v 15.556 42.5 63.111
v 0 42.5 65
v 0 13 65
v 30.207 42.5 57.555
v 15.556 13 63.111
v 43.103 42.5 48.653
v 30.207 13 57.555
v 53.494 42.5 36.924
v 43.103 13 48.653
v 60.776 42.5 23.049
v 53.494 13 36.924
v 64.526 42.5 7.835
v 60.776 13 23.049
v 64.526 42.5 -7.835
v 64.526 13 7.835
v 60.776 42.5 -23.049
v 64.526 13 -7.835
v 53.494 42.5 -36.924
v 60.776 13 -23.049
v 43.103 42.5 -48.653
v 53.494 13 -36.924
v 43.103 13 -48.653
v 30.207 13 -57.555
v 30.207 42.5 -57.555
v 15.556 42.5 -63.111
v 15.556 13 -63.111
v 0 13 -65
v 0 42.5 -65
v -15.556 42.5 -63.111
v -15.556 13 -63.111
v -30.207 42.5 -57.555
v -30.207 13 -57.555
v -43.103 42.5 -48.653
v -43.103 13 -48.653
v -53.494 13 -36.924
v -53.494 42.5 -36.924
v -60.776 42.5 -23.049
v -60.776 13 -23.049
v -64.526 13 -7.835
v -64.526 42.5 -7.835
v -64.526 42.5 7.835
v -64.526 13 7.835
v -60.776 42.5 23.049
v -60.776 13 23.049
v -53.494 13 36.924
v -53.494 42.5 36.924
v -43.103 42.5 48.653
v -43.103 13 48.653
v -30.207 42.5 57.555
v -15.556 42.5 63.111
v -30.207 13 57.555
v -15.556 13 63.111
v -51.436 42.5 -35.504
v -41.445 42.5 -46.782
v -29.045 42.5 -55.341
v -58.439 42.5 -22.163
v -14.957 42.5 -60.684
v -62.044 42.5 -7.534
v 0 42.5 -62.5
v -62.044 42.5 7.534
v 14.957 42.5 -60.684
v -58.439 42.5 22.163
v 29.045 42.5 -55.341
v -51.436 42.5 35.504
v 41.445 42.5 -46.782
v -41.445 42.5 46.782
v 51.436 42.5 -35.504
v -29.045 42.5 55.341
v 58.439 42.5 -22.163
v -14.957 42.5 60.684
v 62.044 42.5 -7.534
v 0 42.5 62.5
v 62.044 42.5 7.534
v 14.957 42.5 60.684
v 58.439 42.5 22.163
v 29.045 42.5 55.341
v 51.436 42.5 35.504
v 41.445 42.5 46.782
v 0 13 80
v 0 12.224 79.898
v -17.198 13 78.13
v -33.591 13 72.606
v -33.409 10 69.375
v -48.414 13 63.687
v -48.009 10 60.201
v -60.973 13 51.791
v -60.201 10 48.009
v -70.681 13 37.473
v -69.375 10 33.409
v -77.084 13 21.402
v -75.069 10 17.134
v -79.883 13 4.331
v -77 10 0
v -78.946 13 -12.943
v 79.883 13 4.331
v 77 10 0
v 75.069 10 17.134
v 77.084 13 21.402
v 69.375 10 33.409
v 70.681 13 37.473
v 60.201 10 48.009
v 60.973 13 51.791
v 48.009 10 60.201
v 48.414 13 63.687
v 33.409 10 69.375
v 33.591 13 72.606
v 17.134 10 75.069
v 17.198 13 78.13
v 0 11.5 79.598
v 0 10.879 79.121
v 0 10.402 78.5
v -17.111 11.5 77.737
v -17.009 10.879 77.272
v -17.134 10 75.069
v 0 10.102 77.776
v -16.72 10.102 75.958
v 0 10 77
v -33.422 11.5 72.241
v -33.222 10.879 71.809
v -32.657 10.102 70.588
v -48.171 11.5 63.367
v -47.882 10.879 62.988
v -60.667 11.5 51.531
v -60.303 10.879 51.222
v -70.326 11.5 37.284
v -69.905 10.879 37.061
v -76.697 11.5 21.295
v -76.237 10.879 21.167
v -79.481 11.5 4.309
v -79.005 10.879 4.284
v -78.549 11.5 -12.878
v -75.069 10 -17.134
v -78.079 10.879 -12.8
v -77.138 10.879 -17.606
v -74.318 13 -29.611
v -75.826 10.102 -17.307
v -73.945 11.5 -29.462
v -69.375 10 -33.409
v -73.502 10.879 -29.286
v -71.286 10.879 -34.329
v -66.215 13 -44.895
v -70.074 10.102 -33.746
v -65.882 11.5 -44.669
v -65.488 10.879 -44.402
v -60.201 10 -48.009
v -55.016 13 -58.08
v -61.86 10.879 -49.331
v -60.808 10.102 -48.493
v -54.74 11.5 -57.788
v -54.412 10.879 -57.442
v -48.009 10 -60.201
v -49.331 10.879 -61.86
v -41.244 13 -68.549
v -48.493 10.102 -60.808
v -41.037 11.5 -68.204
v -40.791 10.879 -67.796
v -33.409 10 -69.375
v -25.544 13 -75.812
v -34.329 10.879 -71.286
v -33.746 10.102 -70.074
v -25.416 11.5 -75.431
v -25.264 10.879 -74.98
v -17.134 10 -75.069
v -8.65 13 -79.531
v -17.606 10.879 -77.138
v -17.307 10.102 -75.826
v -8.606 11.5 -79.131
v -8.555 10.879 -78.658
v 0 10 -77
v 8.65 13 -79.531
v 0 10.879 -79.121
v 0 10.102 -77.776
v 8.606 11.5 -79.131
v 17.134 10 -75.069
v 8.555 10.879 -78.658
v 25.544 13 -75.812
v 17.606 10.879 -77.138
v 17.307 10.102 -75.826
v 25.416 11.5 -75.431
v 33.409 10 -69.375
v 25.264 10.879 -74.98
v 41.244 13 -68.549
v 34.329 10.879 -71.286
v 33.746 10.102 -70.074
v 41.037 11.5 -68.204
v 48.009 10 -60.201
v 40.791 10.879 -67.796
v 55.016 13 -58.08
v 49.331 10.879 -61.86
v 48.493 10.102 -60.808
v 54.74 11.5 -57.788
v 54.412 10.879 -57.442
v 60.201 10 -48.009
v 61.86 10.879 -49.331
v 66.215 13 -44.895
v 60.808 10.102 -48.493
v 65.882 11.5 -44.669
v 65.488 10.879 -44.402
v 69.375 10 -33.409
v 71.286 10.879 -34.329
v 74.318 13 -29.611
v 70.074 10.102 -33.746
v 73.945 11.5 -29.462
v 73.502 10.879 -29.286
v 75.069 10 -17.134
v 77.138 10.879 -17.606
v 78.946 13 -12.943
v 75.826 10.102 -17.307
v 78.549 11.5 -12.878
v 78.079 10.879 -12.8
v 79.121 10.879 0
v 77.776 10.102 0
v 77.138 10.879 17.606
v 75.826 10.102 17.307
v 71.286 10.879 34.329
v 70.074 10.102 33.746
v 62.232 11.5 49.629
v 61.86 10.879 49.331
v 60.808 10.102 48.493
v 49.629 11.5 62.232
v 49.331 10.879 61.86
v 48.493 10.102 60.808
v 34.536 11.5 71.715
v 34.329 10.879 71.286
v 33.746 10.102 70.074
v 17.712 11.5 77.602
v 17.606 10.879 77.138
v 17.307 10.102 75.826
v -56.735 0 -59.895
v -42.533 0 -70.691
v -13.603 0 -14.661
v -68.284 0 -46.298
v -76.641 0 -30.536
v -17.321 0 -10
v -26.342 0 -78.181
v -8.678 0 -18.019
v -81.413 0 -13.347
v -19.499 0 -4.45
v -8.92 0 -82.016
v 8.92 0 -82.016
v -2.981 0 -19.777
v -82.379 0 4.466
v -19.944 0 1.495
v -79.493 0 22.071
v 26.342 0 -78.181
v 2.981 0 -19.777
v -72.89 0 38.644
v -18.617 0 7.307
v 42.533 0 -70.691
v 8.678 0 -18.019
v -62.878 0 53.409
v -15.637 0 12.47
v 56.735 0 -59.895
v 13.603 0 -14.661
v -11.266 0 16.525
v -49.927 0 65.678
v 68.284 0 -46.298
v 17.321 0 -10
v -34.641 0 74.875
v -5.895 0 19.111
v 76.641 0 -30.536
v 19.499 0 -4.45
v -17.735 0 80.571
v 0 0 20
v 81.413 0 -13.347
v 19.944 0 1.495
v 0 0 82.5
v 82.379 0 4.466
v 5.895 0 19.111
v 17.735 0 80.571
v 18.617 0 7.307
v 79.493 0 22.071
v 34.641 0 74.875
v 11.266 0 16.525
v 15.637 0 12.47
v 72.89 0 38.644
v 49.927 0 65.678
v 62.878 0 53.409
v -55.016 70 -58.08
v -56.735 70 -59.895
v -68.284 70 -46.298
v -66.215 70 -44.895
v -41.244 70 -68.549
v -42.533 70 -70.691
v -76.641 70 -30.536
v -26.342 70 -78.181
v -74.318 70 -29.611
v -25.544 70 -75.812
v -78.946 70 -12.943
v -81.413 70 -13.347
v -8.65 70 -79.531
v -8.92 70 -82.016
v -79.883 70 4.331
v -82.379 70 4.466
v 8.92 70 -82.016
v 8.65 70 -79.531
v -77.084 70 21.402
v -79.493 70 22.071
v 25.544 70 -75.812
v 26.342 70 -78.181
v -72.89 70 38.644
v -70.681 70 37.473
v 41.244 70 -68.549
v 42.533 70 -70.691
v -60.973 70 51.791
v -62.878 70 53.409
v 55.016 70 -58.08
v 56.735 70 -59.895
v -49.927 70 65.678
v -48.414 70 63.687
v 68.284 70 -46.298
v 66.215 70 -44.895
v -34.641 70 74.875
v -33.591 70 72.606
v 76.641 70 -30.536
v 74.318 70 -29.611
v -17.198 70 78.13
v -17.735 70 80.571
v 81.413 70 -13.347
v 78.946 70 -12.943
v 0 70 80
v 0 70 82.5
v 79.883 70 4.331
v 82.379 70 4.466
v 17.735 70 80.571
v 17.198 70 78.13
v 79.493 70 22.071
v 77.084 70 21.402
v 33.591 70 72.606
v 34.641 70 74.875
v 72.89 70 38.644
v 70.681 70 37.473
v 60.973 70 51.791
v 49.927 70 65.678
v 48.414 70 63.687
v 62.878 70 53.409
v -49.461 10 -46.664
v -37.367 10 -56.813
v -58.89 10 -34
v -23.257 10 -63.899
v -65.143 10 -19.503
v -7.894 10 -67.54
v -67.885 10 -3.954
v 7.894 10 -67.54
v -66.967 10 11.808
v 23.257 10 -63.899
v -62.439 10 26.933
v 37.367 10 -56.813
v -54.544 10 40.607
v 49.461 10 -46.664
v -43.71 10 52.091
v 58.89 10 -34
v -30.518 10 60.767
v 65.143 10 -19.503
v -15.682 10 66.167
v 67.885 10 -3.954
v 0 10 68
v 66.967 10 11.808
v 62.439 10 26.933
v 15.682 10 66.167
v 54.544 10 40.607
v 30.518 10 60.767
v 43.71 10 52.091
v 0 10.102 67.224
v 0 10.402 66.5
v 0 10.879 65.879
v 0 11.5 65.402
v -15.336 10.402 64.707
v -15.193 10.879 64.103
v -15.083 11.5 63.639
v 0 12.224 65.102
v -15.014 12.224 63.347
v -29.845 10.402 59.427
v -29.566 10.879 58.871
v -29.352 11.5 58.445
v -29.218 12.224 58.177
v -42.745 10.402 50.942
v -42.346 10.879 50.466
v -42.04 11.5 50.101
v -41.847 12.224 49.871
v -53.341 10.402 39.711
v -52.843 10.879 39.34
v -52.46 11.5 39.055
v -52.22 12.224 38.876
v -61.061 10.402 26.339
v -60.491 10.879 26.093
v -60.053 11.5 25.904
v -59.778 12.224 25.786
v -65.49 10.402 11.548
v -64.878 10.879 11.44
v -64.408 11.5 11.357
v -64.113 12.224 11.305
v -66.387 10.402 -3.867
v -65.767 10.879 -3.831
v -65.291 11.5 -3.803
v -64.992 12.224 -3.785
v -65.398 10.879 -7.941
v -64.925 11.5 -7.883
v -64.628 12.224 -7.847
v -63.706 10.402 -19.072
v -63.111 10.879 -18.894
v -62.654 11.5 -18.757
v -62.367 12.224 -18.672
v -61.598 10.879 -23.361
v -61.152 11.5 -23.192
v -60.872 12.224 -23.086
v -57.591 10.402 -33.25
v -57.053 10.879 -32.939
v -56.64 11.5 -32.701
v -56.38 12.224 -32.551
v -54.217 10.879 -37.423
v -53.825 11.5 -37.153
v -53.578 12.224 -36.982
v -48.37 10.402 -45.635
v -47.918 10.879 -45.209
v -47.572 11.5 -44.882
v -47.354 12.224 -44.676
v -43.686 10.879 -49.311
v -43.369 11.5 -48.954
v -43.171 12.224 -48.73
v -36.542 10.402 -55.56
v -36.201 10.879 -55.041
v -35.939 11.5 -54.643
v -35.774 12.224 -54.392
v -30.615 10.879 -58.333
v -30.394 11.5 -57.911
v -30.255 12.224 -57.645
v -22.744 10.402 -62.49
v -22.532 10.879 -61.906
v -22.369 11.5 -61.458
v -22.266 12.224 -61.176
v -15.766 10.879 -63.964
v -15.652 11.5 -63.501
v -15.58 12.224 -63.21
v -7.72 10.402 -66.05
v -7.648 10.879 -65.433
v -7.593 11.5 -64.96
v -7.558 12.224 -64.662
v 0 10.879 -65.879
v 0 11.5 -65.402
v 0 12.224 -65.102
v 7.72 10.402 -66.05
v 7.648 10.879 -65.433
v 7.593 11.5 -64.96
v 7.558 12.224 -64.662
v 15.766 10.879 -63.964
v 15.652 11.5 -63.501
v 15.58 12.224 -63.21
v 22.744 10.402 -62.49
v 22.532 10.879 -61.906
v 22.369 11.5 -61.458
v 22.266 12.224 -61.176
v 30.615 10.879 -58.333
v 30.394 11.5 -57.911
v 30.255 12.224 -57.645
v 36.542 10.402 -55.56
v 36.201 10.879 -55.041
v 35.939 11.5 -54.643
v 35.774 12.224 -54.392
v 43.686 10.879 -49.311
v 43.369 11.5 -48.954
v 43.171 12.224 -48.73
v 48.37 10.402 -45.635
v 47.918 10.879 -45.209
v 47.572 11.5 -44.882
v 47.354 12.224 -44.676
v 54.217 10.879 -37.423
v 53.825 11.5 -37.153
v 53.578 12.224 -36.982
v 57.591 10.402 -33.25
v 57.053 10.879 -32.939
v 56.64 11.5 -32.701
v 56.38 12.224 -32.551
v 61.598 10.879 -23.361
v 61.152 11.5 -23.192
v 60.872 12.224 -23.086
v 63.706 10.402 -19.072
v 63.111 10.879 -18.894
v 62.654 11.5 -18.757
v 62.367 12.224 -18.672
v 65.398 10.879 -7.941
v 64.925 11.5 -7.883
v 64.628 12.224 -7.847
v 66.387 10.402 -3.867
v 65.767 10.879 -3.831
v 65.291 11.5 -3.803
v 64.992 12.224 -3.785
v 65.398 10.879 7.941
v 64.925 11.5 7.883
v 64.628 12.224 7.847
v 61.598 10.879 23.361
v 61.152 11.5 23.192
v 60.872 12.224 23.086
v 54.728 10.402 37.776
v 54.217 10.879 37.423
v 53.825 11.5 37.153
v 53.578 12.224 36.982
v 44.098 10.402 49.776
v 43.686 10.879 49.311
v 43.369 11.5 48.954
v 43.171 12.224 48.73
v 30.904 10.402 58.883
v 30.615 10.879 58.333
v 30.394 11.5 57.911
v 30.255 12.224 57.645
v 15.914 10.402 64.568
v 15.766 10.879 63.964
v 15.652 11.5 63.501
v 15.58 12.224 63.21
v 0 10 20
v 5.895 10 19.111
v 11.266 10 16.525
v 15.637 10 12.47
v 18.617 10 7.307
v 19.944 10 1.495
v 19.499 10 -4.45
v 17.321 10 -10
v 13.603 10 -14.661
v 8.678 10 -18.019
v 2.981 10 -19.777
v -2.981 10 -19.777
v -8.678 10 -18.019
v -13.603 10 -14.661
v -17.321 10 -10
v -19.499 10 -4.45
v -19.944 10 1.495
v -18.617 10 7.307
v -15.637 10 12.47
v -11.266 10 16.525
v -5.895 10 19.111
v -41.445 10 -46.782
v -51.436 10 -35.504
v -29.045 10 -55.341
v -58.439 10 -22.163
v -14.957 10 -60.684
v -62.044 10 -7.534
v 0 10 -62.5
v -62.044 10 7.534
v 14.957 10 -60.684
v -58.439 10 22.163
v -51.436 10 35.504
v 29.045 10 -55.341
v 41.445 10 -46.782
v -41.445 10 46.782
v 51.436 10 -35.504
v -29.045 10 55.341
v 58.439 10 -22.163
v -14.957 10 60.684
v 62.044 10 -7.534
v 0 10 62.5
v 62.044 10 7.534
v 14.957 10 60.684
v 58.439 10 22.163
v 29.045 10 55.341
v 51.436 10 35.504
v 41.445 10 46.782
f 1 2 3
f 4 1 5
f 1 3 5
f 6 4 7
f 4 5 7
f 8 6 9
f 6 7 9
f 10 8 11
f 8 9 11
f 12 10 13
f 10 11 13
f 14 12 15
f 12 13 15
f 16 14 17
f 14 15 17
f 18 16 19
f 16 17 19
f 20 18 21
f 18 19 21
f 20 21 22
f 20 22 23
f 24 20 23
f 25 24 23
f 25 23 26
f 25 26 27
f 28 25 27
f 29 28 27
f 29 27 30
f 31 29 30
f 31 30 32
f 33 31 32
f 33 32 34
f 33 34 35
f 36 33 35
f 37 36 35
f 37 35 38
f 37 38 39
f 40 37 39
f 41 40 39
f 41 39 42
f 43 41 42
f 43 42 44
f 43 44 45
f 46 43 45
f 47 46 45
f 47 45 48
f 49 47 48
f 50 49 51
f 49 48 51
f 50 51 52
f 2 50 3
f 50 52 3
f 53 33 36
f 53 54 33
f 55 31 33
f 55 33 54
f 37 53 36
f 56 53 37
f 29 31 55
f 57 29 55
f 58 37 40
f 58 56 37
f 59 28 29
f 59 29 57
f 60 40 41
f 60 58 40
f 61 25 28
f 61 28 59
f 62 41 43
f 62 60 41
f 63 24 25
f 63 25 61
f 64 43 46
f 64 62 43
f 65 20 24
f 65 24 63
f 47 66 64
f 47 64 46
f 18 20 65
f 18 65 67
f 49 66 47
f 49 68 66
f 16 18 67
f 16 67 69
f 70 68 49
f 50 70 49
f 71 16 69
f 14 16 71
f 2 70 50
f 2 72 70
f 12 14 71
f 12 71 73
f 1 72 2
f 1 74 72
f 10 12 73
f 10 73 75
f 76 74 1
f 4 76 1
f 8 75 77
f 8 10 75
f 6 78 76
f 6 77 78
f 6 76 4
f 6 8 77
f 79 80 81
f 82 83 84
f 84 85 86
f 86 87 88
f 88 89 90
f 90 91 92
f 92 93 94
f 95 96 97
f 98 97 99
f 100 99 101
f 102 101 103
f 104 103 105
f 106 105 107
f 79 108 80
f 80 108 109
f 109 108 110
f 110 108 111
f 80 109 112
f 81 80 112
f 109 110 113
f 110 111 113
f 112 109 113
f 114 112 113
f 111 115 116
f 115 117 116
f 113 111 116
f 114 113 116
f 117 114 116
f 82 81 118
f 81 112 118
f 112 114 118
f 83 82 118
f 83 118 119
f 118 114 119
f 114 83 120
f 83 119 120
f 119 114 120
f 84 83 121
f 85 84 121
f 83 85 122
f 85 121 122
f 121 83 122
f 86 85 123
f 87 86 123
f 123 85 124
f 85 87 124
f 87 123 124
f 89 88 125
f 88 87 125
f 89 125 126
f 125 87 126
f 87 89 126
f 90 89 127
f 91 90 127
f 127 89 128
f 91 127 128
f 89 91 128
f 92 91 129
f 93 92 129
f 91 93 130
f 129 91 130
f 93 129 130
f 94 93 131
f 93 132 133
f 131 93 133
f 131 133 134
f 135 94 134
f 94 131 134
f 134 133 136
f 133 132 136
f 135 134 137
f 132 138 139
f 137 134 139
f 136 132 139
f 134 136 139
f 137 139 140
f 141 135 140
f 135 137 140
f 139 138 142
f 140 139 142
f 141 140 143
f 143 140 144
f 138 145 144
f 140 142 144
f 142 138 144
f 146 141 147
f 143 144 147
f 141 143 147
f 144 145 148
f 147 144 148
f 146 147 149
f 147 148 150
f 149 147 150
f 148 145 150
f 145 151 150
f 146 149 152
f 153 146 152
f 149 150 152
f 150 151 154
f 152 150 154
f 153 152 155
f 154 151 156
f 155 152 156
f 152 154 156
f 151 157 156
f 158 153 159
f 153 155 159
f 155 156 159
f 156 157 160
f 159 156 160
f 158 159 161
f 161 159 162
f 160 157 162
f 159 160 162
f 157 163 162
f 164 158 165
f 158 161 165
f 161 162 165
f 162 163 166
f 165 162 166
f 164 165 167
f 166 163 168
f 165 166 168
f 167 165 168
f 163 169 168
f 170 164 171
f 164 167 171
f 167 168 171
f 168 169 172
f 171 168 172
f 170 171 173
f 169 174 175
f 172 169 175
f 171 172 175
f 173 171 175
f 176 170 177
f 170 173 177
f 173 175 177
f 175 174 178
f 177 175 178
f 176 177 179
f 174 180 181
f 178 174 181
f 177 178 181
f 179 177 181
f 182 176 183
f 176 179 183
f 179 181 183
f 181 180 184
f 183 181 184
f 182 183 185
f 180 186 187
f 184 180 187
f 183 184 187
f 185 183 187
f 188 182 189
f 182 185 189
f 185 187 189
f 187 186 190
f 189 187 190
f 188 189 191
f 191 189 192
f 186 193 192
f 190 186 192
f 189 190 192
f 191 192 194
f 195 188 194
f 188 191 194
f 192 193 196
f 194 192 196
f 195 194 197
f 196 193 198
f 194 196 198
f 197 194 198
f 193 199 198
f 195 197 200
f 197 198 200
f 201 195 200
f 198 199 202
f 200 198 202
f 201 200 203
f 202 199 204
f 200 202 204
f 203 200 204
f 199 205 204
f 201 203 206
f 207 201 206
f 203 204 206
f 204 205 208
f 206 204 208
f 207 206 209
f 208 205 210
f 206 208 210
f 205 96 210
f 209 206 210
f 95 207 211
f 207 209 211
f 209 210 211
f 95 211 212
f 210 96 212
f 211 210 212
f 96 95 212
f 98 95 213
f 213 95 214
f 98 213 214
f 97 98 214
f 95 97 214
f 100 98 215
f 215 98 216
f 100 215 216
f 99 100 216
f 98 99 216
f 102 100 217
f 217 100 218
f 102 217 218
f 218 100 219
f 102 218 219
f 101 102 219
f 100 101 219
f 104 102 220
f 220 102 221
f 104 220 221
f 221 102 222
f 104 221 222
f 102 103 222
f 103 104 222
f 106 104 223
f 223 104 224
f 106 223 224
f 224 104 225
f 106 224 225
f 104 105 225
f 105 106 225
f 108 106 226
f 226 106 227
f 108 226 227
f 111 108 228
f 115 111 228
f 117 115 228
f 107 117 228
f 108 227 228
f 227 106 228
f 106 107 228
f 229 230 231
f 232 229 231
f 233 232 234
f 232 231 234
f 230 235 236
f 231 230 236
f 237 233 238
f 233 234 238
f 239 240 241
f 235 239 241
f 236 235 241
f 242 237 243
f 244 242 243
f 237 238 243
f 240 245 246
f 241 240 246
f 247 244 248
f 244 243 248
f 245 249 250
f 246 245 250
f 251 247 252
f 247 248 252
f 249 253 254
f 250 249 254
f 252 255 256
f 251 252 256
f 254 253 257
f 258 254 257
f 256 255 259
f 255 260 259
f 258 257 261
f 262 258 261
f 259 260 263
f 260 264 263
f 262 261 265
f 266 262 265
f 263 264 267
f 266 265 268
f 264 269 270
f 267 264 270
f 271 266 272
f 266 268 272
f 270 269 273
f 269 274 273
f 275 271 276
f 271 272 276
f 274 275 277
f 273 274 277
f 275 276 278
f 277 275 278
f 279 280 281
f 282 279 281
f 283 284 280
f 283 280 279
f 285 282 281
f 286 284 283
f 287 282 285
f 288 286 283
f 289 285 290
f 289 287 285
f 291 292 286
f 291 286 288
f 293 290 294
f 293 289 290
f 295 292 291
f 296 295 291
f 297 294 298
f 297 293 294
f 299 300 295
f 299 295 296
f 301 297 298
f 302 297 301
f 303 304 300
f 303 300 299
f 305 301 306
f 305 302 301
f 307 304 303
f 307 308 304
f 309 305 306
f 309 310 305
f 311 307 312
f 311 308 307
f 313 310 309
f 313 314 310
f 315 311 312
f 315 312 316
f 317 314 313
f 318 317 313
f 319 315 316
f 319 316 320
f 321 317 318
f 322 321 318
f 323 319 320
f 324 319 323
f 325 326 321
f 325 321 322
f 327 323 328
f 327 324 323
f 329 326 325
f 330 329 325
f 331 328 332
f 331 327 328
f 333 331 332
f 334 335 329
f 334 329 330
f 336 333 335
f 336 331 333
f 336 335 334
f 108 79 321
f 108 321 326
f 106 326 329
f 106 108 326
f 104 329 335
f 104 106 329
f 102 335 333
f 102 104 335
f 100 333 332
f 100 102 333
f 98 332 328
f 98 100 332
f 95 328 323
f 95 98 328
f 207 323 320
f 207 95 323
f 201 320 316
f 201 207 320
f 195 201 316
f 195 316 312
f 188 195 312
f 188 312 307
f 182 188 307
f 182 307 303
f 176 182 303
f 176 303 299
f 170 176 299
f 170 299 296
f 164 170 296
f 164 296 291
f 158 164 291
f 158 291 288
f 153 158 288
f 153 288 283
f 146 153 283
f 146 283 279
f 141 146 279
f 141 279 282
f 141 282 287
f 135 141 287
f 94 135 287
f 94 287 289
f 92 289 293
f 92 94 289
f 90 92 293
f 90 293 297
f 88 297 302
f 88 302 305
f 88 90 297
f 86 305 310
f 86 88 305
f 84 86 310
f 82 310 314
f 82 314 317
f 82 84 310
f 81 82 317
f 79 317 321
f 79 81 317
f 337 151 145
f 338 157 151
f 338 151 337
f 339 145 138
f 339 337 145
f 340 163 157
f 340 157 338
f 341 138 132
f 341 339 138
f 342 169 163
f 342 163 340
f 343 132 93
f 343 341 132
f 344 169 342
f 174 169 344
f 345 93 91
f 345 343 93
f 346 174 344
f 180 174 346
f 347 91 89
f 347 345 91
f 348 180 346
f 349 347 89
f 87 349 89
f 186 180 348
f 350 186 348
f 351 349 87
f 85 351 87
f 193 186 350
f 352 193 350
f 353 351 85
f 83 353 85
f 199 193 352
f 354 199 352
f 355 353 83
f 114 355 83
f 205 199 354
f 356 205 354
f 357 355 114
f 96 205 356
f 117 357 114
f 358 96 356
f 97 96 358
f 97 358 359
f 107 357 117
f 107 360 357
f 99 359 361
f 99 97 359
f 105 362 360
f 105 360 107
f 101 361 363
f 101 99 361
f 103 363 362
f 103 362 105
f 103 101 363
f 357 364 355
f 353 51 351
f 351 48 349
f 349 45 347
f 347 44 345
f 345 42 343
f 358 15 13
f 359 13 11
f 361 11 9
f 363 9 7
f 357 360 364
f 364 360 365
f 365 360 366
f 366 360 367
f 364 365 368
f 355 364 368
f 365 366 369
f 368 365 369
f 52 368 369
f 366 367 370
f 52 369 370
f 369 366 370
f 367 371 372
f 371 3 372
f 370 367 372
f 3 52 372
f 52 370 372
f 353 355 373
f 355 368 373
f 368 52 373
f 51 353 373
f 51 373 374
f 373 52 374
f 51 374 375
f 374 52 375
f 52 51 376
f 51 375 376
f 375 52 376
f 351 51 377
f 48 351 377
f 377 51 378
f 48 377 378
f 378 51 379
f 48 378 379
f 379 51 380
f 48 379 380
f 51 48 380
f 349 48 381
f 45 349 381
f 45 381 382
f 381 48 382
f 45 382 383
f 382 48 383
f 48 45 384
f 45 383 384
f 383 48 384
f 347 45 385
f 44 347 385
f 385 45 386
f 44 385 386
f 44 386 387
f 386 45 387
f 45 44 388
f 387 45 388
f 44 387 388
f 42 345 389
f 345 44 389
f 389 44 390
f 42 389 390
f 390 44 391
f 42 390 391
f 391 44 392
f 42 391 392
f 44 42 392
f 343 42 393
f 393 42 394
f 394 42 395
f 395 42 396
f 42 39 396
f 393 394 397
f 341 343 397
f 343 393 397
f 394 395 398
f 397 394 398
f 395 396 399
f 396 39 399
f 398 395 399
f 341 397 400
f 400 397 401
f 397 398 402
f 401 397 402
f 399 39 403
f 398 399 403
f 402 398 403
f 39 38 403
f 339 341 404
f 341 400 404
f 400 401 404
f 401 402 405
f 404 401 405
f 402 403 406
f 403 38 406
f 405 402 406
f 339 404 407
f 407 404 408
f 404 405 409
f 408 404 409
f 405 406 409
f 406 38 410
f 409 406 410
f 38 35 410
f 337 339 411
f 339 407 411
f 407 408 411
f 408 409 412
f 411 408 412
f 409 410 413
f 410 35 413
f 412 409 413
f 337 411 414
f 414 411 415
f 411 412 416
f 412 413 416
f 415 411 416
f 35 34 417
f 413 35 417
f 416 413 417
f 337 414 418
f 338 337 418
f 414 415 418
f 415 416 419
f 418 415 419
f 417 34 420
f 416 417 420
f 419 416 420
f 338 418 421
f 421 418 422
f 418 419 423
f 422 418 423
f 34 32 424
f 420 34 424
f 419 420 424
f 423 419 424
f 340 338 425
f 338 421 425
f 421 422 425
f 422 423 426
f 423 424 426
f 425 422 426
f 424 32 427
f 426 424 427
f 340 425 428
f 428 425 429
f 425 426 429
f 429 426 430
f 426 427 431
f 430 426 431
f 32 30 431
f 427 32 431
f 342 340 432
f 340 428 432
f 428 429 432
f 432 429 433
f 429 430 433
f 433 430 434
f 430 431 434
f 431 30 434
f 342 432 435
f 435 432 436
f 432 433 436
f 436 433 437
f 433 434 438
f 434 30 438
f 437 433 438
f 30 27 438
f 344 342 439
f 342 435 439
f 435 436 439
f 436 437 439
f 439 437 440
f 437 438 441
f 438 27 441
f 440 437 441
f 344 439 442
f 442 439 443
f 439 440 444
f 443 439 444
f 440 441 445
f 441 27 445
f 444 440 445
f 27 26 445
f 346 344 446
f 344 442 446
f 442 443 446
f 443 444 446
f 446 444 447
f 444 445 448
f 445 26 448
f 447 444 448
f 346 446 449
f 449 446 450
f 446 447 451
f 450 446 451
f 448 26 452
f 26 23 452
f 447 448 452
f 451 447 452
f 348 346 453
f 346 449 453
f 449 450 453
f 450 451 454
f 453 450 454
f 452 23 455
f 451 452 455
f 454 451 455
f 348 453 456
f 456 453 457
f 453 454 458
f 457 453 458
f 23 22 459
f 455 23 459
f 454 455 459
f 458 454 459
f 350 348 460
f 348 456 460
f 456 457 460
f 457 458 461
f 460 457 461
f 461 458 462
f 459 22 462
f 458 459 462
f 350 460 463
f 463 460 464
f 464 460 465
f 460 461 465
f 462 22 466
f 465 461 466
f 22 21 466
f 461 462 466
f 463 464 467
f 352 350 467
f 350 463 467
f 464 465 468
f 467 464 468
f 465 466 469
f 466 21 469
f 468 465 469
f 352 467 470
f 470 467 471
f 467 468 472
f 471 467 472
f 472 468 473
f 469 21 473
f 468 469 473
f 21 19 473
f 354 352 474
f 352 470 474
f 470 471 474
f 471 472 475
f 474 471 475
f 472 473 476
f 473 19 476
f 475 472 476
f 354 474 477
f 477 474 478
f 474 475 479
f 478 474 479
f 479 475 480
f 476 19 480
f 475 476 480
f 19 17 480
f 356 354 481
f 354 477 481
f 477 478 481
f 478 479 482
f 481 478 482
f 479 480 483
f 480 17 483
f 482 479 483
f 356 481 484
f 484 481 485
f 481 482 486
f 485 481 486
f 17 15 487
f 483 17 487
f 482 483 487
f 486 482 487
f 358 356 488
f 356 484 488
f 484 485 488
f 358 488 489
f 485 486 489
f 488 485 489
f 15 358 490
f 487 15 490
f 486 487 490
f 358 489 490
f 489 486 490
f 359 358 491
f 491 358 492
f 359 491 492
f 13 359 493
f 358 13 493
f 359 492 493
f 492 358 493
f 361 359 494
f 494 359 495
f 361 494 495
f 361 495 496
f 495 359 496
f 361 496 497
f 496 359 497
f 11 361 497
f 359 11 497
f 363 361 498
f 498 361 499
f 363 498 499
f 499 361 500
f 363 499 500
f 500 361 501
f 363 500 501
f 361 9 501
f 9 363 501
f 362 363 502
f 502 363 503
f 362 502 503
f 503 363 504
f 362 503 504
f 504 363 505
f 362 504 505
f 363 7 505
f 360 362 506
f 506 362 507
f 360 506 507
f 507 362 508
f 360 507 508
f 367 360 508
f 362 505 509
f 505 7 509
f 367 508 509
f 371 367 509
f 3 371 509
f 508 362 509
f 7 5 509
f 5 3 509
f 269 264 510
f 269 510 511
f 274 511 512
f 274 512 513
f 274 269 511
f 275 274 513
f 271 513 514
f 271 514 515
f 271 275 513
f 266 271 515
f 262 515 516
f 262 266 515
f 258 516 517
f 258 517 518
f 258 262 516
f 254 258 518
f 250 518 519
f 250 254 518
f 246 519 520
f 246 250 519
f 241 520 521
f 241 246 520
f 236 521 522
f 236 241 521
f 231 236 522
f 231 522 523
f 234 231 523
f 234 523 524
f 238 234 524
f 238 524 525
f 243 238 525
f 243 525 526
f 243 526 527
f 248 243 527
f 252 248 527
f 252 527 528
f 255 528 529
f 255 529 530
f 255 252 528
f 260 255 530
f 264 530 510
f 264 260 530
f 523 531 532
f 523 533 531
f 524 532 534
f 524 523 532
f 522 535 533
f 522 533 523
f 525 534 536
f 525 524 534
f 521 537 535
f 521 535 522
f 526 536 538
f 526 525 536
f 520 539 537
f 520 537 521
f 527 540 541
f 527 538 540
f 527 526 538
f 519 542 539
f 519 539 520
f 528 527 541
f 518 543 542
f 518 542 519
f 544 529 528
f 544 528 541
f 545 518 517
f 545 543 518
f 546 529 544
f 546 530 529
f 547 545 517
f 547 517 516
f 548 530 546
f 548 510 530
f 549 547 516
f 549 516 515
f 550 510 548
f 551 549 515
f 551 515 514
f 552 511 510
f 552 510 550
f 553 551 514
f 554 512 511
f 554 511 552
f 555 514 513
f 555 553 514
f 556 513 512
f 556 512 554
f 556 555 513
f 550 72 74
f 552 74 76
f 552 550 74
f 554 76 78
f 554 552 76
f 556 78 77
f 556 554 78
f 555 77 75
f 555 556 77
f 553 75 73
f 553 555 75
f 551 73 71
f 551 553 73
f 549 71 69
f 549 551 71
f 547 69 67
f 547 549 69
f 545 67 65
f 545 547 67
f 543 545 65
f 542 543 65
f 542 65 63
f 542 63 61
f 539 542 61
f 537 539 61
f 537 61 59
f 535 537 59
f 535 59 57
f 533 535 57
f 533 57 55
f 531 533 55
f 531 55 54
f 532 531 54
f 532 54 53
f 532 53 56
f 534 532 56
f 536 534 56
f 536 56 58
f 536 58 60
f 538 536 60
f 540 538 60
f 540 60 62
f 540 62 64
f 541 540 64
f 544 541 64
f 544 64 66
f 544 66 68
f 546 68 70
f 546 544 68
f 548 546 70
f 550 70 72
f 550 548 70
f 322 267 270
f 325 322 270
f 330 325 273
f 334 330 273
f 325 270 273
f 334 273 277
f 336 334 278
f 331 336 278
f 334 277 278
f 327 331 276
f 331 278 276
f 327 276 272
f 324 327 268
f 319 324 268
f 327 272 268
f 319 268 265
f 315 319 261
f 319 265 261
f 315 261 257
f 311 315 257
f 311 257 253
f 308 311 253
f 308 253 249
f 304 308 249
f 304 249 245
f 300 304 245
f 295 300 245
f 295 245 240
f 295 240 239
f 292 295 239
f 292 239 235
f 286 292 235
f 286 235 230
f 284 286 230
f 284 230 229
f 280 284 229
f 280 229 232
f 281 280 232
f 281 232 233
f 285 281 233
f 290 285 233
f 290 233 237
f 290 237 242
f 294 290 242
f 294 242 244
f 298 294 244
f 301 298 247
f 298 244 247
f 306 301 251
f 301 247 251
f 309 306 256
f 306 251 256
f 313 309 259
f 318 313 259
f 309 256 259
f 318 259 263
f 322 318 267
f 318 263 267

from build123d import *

# Parameters (mm, degrees)
SKETCH11_R          = 82.5
SKETCH11_R_2        = 20
BOSS_EXTRUDE7_DEPTH = 10
SKETCH11_9_R        = 82.5
SKETCH11_9_R_2      = 80
BOSS_EXTRUDE8_DEPTH = 70
SKETCH11_10_R       = 65
SKETCH11_10_R_2     = 62.5
BOSS_EXTRUDE9_DEPTH = 42.5
FILLET2_R           = 3
FILLET3_R           = 3


with BuildPart() as part:
    # Sketch11 → Boss-Extrude7 (new body)
    with BuildSketch(Plane(origin=(0, 0, 0), x_dir=(1, 0, 0), z_dir=(0, 1, 0))):
        Circle(SKETCH11_R)
        Circle(SKETCH11_R_2, mode=Mode.SUBTRACT)
    extrude(amount=BOSS_EXTRUDE7_DEPTH)

    # Sketch11<9> → Boss-Extrude8 (add)
    with BuildSketch(Plane(origin=(0, 0, 0), x_dir=(1, 0, 0), z_dir=(0, 1, 0))):
        Circle(SKETCH11_9_R)
        Circle(SKETCH11_9_R_2, mode=Mode.SUBTRACT)
    extrude(amount=BOSS_EXTRUDE8_DEPTH)

    # Sketch11<10> → Boss-Extrude9 (add)
    with BuildSketch(Plane(origin=(0, 0, 0), x_dir=(1, 0, 0), z_dir=(0, 1, 0))):
        Circle(SKETCH11_10_R)
        Circle(SKETCH11_10_R_2, mode=Mode.SUBTRACT)
    extrude(amount=BOSS_EXTRUDE9_DEPTH)

    # Fillet2
    fillet2_edges = [part.edges().sort_by_distance(p)[0] for p in [
        (-80, 10, 0),
    ]]
    fillet(fillet2_edges, radius=FILLET2_R)

    # Fillet3
    fillet3_edges = [part.edges().sort_by_distance(p)[0] for p in [
        (-65, 10, 0),
    ]]
    fillet(fillet3_edges, radius=FILLET3_R)


solid = part.part
